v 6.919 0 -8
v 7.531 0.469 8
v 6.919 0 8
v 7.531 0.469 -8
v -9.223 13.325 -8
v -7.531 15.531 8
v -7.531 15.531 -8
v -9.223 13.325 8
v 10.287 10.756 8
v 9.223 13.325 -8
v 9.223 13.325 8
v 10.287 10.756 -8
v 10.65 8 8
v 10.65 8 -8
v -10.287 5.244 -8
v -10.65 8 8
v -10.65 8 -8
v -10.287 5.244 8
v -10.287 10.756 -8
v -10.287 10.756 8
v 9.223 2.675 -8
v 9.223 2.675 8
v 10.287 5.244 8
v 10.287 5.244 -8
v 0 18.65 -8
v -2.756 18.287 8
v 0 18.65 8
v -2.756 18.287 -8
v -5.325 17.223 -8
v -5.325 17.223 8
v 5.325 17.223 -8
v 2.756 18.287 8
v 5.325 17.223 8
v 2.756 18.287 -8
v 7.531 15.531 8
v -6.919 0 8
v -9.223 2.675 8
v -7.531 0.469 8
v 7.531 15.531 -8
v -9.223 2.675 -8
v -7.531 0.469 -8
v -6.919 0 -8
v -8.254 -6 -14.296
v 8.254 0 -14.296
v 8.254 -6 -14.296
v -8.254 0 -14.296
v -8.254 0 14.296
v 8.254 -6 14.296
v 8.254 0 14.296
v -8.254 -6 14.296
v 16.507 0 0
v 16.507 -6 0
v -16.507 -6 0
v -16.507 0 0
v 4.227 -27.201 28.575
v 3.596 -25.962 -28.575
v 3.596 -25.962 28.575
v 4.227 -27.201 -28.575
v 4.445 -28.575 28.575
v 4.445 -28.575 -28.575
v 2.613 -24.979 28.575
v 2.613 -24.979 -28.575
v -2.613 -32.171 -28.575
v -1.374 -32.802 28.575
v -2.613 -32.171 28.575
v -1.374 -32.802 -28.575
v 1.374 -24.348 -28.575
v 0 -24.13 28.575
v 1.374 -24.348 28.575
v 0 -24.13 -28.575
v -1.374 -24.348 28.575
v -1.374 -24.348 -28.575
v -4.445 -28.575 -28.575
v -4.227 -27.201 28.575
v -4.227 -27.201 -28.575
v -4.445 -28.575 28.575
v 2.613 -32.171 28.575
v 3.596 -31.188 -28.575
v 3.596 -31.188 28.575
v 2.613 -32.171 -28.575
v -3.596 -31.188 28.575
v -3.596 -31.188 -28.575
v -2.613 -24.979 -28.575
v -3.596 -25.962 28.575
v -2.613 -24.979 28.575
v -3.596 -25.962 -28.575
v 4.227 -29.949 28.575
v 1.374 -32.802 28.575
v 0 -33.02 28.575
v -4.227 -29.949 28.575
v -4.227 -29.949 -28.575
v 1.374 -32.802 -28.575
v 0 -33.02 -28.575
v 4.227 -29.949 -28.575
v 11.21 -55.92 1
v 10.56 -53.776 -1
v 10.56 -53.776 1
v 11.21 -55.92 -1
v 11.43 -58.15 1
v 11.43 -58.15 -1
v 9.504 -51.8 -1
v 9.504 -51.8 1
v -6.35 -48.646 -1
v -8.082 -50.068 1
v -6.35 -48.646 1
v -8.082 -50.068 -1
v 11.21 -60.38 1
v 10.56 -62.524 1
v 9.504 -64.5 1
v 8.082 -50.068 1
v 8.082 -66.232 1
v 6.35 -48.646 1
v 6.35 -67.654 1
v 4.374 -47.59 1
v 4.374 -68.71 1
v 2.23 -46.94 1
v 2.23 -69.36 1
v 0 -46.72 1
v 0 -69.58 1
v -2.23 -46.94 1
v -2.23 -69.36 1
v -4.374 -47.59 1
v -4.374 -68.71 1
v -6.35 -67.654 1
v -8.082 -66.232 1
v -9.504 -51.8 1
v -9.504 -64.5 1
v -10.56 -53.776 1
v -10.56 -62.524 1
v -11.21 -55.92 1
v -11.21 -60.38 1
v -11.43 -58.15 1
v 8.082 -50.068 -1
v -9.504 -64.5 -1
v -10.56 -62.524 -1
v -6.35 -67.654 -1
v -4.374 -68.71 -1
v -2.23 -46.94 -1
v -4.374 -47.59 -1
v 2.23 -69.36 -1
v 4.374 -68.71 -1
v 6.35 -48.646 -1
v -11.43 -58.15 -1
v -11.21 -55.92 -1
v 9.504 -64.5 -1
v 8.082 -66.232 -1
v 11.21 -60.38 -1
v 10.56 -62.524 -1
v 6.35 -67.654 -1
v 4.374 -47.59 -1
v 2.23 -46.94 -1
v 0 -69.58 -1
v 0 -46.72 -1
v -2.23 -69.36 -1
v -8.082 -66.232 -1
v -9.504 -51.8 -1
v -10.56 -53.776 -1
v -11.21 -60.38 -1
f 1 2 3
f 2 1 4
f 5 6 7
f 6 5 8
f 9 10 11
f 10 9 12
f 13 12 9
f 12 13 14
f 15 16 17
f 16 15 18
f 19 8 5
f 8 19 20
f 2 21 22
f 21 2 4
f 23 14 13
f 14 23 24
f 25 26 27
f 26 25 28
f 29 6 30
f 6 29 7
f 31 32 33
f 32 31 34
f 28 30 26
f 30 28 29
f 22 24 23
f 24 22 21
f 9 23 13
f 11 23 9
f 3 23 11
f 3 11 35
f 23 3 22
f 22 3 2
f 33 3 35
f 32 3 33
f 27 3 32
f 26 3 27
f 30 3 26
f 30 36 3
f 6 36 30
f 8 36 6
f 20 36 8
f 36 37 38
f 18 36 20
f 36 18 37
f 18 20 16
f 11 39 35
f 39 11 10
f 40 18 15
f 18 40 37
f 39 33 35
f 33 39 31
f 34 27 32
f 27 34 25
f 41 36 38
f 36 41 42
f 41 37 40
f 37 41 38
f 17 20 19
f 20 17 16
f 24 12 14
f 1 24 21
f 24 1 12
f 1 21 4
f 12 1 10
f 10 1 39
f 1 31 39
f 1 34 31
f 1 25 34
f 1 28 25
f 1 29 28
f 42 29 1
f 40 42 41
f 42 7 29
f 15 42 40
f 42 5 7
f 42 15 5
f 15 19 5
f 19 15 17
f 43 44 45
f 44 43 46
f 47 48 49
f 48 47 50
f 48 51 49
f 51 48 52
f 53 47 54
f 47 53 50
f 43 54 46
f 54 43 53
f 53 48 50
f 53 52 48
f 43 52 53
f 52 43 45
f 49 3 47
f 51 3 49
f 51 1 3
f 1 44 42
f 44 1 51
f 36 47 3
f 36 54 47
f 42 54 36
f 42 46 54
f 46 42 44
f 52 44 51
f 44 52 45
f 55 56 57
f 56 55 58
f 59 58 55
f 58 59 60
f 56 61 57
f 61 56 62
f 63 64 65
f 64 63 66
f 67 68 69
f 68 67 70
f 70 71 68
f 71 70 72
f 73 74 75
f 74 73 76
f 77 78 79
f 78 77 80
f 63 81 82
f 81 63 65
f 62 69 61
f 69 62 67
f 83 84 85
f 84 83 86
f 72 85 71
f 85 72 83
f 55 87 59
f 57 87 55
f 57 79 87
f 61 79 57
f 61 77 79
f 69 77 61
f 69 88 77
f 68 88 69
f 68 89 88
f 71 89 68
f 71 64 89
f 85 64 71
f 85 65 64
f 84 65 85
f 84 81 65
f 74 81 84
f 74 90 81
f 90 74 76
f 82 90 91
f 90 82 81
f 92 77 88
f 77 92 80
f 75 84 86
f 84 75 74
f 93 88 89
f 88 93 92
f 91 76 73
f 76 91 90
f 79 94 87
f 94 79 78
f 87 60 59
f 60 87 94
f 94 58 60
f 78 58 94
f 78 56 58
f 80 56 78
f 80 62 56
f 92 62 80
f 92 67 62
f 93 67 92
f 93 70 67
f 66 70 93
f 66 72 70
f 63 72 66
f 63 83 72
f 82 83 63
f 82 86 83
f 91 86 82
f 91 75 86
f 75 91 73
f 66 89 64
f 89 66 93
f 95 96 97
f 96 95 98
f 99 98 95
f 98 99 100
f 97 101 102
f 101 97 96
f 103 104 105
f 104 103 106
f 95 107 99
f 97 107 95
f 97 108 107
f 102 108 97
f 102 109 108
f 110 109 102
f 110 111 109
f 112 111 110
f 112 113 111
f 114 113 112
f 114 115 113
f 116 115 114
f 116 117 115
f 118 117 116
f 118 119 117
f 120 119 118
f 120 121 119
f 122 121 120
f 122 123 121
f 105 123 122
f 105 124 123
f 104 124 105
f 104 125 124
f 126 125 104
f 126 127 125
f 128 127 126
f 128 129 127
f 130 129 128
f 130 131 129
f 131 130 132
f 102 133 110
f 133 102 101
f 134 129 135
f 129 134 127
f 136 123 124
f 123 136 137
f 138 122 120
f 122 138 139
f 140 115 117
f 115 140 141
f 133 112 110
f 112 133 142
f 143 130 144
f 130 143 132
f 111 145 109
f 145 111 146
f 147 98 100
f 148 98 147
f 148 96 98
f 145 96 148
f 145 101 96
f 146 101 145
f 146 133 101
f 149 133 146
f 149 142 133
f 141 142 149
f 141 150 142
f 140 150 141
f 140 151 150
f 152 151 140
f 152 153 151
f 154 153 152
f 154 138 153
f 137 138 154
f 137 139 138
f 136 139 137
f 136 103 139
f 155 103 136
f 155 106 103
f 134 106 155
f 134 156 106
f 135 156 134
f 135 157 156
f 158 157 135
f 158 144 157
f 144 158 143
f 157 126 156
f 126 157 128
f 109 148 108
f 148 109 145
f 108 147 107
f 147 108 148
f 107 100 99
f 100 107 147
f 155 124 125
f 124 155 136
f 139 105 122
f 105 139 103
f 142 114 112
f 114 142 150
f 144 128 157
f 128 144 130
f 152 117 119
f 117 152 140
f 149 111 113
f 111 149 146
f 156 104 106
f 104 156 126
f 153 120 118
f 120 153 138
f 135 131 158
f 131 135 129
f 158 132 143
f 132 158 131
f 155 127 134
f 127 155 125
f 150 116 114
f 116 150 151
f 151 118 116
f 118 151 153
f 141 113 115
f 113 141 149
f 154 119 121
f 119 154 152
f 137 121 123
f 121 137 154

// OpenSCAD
// Auto-generated by scripts/author_from_manifest.py (Phase D.3).
// Source: data/phase_d_manifest.json (sku_intent='reliable-g6-concealed-175f').
// Do not hand-edit — regenerate from the manifest.
//
// @part reliable_g6_concealed_175f
// @kind sprinkler_head
// @category head.pendant.k56
// @display-name "Reliable G6 Concealed Pendent K5.6 175°F"
// @mfg reliable_automatic_sprinkler
// @mfg-pn G6
// @listing UL FM
// @hazard-classes LH OH1
// @price-usd 26.50
// @install-minutes 10
// @crew journeyman
// @k-factor 5.6
// @orientation pendant
// @response quick
// @temperature 175F
// @param size_in number default=0.5 label="Size" unit="in"
// @port inlet position=[0,0.014,0] direction=[0,1,0] style=NPT_threaded size_in=0.5 role=drop

size_in = 0.5;
k_factor = 5.6;

length_mm   = 57.15;
body_dia_mm = 25.40;
thread_od   = 21.3;
thread_len  = 16;
deflector_d = body_dia_mm * 0.9;

 union() {
    translate([0, thread_len/2, 0])
        cylinder(h = thread_len, d = thread_od, center = true, $fn = 24);
    translate([0, -3, 0])
        rotate([90, 0, 0])
        cylinder(h = 6, d = thread_od * 1.55, $fn = 6, center = true);
    translate([0, -length_mm/2, 0])
        cylinder(h = length_mm, d = body_dia_mm * 0.35, center = true, $fn = 20);
    translate([0, -length_mm - 1, 0])
        cylinder(h = 2, d = deflector_d, center = true, $fn = 32);
}
